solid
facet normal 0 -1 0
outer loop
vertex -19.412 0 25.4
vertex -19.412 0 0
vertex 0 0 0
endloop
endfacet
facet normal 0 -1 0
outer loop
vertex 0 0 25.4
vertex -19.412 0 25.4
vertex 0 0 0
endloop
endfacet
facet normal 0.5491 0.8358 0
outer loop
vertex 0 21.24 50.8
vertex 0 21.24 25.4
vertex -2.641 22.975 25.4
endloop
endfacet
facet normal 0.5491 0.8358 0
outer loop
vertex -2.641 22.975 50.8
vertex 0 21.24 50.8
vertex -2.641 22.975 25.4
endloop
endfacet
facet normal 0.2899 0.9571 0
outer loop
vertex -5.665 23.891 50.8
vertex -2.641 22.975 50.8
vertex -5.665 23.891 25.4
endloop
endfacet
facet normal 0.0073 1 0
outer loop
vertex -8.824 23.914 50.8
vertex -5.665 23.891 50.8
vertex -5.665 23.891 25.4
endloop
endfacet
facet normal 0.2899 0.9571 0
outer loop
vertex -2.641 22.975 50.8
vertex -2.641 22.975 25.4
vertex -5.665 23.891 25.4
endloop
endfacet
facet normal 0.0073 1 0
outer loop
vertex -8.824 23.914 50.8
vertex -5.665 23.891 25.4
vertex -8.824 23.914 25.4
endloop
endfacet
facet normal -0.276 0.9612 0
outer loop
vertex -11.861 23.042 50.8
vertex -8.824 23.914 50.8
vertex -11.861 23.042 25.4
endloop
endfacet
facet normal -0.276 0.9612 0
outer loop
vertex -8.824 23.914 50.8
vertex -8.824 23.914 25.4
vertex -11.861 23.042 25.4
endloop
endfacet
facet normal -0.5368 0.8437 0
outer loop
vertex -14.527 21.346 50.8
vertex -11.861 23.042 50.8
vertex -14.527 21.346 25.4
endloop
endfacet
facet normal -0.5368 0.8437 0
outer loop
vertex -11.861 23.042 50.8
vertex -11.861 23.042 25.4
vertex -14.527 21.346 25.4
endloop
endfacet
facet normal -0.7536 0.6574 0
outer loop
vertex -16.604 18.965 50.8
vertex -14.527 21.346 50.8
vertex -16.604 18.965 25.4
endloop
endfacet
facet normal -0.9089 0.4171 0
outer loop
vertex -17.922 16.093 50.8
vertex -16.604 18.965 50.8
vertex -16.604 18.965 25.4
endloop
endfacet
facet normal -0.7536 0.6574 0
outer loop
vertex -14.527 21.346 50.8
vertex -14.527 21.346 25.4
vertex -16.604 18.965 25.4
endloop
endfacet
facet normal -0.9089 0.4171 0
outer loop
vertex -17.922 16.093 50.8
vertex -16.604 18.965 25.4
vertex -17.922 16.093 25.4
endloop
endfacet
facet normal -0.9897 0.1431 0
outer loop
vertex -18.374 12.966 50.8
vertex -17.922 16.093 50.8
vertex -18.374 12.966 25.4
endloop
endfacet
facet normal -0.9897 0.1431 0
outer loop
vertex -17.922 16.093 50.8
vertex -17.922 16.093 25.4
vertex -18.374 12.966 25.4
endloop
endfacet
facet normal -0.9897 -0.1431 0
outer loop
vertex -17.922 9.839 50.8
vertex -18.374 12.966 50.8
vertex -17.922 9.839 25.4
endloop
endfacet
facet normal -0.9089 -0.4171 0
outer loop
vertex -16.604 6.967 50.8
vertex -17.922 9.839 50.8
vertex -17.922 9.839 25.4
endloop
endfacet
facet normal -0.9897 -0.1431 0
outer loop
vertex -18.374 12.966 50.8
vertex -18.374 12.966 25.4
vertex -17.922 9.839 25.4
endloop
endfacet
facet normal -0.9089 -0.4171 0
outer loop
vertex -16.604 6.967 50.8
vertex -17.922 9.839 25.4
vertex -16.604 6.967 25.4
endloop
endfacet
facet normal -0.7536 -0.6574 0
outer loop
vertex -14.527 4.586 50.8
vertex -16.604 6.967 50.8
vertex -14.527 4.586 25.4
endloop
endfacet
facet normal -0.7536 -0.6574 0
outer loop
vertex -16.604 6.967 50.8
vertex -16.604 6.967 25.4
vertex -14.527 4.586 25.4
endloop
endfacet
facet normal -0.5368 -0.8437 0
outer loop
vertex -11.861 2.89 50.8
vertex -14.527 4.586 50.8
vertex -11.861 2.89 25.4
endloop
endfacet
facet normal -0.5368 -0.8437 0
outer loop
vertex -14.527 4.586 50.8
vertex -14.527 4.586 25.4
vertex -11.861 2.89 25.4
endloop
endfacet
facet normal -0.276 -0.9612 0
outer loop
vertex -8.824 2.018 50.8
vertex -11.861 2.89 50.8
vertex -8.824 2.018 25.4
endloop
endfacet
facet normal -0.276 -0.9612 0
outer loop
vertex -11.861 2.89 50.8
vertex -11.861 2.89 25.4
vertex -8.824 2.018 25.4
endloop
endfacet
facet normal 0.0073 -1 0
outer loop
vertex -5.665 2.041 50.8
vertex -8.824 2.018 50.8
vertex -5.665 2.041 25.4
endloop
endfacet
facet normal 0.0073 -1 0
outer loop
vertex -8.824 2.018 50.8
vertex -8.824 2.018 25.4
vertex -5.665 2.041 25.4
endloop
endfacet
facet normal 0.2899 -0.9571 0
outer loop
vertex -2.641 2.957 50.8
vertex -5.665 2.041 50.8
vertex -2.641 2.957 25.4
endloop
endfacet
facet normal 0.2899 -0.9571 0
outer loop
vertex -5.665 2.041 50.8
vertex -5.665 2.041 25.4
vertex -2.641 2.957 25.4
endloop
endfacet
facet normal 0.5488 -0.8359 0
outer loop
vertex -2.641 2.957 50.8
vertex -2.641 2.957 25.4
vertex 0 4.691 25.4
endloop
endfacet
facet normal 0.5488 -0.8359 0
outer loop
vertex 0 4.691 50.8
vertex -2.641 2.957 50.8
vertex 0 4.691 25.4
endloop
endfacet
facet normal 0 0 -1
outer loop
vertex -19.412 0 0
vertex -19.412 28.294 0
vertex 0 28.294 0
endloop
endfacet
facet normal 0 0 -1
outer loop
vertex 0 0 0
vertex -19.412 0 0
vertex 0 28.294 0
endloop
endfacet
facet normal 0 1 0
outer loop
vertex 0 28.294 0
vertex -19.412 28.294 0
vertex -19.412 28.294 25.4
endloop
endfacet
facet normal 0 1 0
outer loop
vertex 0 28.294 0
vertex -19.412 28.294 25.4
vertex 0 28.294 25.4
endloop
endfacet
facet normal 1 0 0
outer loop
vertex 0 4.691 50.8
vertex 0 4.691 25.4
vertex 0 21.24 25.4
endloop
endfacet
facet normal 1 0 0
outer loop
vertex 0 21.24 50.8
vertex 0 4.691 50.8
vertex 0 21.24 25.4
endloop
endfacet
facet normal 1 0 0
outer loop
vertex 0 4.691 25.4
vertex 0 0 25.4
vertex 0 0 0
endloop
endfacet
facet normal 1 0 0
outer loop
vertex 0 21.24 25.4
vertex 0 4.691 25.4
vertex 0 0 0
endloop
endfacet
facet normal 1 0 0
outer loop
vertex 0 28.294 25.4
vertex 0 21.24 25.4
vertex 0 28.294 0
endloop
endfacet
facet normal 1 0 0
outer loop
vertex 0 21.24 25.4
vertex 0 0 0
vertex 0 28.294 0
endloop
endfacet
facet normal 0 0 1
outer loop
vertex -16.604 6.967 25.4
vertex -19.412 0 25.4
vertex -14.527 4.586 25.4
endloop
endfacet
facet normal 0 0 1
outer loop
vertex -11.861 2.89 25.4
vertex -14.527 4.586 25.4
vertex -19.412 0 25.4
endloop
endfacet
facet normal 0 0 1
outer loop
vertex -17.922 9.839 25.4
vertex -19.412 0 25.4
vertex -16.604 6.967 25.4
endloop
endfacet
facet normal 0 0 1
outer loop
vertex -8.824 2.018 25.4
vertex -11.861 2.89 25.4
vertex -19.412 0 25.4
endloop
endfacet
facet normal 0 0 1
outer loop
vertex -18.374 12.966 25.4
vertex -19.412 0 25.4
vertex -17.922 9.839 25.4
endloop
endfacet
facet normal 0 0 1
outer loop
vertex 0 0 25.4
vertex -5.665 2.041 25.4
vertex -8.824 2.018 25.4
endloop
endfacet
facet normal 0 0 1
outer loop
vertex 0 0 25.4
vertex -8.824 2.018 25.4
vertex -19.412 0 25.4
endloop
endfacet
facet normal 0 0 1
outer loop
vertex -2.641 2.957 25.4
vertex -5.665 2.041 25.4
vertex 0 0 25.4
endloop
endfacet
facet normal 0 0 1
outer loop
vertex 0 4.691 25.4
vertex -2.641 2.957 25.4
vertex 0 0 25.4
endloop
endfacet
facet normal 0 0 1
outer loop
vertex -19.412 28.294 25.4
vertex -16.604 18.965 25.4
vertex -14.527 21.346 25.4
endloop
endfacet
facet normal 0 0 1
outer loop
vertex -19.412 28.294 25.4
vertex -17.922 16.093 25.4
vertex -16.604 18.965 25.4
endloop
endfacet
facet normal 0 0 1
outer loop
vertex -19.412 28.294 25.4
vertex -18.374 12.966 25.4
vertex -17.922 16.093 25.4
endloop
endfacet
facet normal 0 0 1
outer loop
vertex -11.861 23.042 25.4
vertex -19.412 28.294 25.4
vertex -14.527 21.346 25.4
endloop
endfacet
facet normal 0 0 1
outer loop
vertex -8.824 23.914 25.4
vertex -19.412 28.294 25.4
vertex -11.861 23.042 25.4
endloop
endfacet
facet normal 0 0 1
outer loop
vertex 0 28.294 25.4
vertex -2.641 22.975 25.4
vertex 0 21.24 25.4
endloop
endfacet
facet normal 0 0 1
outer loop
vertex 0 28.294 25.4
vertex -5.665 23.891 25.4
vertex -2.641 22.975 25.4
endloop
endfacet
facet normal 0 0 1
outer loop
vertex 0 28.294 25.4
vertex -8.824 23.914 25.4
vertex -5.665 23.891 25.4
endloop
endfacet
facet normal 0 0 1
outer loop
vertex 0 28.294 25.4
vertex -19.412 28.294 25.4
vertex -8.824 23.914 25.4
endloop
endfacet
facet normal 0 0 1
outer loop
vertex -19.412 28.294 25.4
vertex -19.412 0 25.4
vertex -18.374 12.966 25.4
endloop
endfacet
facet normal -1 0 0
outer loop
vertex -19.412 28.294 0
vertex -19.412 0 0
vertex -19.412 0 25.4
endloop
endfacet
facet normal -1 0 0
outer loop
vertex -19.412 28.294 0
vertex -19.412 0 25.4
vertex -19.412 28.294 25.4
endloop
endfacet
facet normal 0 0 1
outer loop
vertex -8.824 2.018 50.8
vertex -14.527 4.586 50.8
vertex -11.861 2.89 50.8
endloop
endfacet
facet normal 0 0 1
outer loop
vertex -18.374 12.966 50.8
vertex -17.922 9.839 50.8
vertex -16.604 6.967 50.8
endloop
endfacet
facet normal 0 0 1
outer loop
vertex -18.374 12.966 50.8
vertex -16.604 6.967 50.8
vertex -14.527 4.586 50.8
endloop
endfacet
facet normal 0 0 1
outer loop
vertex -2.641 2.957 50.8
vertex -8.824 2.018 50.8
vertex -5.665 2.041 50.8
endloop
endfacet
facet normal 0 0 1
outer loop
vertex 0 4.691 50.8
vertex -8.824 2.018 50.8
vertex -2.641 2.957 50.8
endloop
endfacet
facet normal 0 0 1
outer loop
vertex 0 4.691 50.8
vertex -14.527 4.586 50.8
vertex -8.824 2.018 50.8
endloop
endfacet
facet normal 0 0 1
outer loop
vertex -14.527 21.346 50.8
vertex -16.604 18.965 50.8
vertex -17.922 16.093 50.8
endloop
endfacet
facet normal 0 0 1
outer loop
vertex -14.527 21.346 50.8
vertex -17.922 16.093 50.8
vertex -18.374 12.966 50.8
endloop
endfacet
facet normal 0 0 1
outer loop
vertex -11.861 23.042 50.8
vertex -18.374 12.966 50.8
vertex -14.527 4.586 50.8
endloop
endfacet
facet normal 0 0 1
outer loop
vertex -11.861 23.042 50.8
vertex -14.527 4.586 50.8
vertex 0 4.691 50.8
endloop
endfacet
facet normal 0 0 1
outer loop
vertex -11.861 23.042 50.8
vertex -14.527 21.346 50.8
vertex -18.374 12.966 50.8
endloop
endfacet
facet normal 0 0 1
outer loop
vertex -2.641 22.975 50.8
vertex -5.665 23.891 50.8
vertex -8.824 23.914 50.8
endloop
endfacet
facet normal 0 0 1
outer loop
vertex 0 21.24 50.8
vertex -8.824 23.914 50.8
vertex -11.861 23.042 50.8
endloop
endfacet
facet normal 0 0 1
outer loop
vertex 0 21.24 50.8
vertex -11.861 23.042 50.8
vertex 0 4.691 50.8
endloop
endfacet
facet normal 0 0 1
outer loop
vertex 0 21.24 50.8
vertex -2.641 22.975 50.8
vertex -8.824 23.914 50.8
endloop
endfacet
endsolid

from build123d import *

# Parameters (mm, degrees)
F0_W     = 19.4115899503
F0_H     = 28.2941963524
F1_DEPTH = 25.4
F3_DEPTH = 25.4


with BuildPart() as f1:
    # F0 (on Top) → F1 (new body)
    with BuildSketch(Plane.XY):
        with Locations((-9.7057949752, 14.1470981762)):
            Rectangle(F0_W, F0_H)
    extrude(amount=F1_DEPTH)

    # F2 (on face) → F3 (join)
    with BuildSketch(Plane.XY.offset(25.4)):
        with BuildLine():
            Line((0, 4.6914111863), (0, 21.2403103669))
            ThreePointArc((0, 21.2403103669), (-18.3741405241, 12.9658607766), (0, 4.6914111863))
        make_face()
    extrude(amount=F3_DEPTH)


solid = f1.part
